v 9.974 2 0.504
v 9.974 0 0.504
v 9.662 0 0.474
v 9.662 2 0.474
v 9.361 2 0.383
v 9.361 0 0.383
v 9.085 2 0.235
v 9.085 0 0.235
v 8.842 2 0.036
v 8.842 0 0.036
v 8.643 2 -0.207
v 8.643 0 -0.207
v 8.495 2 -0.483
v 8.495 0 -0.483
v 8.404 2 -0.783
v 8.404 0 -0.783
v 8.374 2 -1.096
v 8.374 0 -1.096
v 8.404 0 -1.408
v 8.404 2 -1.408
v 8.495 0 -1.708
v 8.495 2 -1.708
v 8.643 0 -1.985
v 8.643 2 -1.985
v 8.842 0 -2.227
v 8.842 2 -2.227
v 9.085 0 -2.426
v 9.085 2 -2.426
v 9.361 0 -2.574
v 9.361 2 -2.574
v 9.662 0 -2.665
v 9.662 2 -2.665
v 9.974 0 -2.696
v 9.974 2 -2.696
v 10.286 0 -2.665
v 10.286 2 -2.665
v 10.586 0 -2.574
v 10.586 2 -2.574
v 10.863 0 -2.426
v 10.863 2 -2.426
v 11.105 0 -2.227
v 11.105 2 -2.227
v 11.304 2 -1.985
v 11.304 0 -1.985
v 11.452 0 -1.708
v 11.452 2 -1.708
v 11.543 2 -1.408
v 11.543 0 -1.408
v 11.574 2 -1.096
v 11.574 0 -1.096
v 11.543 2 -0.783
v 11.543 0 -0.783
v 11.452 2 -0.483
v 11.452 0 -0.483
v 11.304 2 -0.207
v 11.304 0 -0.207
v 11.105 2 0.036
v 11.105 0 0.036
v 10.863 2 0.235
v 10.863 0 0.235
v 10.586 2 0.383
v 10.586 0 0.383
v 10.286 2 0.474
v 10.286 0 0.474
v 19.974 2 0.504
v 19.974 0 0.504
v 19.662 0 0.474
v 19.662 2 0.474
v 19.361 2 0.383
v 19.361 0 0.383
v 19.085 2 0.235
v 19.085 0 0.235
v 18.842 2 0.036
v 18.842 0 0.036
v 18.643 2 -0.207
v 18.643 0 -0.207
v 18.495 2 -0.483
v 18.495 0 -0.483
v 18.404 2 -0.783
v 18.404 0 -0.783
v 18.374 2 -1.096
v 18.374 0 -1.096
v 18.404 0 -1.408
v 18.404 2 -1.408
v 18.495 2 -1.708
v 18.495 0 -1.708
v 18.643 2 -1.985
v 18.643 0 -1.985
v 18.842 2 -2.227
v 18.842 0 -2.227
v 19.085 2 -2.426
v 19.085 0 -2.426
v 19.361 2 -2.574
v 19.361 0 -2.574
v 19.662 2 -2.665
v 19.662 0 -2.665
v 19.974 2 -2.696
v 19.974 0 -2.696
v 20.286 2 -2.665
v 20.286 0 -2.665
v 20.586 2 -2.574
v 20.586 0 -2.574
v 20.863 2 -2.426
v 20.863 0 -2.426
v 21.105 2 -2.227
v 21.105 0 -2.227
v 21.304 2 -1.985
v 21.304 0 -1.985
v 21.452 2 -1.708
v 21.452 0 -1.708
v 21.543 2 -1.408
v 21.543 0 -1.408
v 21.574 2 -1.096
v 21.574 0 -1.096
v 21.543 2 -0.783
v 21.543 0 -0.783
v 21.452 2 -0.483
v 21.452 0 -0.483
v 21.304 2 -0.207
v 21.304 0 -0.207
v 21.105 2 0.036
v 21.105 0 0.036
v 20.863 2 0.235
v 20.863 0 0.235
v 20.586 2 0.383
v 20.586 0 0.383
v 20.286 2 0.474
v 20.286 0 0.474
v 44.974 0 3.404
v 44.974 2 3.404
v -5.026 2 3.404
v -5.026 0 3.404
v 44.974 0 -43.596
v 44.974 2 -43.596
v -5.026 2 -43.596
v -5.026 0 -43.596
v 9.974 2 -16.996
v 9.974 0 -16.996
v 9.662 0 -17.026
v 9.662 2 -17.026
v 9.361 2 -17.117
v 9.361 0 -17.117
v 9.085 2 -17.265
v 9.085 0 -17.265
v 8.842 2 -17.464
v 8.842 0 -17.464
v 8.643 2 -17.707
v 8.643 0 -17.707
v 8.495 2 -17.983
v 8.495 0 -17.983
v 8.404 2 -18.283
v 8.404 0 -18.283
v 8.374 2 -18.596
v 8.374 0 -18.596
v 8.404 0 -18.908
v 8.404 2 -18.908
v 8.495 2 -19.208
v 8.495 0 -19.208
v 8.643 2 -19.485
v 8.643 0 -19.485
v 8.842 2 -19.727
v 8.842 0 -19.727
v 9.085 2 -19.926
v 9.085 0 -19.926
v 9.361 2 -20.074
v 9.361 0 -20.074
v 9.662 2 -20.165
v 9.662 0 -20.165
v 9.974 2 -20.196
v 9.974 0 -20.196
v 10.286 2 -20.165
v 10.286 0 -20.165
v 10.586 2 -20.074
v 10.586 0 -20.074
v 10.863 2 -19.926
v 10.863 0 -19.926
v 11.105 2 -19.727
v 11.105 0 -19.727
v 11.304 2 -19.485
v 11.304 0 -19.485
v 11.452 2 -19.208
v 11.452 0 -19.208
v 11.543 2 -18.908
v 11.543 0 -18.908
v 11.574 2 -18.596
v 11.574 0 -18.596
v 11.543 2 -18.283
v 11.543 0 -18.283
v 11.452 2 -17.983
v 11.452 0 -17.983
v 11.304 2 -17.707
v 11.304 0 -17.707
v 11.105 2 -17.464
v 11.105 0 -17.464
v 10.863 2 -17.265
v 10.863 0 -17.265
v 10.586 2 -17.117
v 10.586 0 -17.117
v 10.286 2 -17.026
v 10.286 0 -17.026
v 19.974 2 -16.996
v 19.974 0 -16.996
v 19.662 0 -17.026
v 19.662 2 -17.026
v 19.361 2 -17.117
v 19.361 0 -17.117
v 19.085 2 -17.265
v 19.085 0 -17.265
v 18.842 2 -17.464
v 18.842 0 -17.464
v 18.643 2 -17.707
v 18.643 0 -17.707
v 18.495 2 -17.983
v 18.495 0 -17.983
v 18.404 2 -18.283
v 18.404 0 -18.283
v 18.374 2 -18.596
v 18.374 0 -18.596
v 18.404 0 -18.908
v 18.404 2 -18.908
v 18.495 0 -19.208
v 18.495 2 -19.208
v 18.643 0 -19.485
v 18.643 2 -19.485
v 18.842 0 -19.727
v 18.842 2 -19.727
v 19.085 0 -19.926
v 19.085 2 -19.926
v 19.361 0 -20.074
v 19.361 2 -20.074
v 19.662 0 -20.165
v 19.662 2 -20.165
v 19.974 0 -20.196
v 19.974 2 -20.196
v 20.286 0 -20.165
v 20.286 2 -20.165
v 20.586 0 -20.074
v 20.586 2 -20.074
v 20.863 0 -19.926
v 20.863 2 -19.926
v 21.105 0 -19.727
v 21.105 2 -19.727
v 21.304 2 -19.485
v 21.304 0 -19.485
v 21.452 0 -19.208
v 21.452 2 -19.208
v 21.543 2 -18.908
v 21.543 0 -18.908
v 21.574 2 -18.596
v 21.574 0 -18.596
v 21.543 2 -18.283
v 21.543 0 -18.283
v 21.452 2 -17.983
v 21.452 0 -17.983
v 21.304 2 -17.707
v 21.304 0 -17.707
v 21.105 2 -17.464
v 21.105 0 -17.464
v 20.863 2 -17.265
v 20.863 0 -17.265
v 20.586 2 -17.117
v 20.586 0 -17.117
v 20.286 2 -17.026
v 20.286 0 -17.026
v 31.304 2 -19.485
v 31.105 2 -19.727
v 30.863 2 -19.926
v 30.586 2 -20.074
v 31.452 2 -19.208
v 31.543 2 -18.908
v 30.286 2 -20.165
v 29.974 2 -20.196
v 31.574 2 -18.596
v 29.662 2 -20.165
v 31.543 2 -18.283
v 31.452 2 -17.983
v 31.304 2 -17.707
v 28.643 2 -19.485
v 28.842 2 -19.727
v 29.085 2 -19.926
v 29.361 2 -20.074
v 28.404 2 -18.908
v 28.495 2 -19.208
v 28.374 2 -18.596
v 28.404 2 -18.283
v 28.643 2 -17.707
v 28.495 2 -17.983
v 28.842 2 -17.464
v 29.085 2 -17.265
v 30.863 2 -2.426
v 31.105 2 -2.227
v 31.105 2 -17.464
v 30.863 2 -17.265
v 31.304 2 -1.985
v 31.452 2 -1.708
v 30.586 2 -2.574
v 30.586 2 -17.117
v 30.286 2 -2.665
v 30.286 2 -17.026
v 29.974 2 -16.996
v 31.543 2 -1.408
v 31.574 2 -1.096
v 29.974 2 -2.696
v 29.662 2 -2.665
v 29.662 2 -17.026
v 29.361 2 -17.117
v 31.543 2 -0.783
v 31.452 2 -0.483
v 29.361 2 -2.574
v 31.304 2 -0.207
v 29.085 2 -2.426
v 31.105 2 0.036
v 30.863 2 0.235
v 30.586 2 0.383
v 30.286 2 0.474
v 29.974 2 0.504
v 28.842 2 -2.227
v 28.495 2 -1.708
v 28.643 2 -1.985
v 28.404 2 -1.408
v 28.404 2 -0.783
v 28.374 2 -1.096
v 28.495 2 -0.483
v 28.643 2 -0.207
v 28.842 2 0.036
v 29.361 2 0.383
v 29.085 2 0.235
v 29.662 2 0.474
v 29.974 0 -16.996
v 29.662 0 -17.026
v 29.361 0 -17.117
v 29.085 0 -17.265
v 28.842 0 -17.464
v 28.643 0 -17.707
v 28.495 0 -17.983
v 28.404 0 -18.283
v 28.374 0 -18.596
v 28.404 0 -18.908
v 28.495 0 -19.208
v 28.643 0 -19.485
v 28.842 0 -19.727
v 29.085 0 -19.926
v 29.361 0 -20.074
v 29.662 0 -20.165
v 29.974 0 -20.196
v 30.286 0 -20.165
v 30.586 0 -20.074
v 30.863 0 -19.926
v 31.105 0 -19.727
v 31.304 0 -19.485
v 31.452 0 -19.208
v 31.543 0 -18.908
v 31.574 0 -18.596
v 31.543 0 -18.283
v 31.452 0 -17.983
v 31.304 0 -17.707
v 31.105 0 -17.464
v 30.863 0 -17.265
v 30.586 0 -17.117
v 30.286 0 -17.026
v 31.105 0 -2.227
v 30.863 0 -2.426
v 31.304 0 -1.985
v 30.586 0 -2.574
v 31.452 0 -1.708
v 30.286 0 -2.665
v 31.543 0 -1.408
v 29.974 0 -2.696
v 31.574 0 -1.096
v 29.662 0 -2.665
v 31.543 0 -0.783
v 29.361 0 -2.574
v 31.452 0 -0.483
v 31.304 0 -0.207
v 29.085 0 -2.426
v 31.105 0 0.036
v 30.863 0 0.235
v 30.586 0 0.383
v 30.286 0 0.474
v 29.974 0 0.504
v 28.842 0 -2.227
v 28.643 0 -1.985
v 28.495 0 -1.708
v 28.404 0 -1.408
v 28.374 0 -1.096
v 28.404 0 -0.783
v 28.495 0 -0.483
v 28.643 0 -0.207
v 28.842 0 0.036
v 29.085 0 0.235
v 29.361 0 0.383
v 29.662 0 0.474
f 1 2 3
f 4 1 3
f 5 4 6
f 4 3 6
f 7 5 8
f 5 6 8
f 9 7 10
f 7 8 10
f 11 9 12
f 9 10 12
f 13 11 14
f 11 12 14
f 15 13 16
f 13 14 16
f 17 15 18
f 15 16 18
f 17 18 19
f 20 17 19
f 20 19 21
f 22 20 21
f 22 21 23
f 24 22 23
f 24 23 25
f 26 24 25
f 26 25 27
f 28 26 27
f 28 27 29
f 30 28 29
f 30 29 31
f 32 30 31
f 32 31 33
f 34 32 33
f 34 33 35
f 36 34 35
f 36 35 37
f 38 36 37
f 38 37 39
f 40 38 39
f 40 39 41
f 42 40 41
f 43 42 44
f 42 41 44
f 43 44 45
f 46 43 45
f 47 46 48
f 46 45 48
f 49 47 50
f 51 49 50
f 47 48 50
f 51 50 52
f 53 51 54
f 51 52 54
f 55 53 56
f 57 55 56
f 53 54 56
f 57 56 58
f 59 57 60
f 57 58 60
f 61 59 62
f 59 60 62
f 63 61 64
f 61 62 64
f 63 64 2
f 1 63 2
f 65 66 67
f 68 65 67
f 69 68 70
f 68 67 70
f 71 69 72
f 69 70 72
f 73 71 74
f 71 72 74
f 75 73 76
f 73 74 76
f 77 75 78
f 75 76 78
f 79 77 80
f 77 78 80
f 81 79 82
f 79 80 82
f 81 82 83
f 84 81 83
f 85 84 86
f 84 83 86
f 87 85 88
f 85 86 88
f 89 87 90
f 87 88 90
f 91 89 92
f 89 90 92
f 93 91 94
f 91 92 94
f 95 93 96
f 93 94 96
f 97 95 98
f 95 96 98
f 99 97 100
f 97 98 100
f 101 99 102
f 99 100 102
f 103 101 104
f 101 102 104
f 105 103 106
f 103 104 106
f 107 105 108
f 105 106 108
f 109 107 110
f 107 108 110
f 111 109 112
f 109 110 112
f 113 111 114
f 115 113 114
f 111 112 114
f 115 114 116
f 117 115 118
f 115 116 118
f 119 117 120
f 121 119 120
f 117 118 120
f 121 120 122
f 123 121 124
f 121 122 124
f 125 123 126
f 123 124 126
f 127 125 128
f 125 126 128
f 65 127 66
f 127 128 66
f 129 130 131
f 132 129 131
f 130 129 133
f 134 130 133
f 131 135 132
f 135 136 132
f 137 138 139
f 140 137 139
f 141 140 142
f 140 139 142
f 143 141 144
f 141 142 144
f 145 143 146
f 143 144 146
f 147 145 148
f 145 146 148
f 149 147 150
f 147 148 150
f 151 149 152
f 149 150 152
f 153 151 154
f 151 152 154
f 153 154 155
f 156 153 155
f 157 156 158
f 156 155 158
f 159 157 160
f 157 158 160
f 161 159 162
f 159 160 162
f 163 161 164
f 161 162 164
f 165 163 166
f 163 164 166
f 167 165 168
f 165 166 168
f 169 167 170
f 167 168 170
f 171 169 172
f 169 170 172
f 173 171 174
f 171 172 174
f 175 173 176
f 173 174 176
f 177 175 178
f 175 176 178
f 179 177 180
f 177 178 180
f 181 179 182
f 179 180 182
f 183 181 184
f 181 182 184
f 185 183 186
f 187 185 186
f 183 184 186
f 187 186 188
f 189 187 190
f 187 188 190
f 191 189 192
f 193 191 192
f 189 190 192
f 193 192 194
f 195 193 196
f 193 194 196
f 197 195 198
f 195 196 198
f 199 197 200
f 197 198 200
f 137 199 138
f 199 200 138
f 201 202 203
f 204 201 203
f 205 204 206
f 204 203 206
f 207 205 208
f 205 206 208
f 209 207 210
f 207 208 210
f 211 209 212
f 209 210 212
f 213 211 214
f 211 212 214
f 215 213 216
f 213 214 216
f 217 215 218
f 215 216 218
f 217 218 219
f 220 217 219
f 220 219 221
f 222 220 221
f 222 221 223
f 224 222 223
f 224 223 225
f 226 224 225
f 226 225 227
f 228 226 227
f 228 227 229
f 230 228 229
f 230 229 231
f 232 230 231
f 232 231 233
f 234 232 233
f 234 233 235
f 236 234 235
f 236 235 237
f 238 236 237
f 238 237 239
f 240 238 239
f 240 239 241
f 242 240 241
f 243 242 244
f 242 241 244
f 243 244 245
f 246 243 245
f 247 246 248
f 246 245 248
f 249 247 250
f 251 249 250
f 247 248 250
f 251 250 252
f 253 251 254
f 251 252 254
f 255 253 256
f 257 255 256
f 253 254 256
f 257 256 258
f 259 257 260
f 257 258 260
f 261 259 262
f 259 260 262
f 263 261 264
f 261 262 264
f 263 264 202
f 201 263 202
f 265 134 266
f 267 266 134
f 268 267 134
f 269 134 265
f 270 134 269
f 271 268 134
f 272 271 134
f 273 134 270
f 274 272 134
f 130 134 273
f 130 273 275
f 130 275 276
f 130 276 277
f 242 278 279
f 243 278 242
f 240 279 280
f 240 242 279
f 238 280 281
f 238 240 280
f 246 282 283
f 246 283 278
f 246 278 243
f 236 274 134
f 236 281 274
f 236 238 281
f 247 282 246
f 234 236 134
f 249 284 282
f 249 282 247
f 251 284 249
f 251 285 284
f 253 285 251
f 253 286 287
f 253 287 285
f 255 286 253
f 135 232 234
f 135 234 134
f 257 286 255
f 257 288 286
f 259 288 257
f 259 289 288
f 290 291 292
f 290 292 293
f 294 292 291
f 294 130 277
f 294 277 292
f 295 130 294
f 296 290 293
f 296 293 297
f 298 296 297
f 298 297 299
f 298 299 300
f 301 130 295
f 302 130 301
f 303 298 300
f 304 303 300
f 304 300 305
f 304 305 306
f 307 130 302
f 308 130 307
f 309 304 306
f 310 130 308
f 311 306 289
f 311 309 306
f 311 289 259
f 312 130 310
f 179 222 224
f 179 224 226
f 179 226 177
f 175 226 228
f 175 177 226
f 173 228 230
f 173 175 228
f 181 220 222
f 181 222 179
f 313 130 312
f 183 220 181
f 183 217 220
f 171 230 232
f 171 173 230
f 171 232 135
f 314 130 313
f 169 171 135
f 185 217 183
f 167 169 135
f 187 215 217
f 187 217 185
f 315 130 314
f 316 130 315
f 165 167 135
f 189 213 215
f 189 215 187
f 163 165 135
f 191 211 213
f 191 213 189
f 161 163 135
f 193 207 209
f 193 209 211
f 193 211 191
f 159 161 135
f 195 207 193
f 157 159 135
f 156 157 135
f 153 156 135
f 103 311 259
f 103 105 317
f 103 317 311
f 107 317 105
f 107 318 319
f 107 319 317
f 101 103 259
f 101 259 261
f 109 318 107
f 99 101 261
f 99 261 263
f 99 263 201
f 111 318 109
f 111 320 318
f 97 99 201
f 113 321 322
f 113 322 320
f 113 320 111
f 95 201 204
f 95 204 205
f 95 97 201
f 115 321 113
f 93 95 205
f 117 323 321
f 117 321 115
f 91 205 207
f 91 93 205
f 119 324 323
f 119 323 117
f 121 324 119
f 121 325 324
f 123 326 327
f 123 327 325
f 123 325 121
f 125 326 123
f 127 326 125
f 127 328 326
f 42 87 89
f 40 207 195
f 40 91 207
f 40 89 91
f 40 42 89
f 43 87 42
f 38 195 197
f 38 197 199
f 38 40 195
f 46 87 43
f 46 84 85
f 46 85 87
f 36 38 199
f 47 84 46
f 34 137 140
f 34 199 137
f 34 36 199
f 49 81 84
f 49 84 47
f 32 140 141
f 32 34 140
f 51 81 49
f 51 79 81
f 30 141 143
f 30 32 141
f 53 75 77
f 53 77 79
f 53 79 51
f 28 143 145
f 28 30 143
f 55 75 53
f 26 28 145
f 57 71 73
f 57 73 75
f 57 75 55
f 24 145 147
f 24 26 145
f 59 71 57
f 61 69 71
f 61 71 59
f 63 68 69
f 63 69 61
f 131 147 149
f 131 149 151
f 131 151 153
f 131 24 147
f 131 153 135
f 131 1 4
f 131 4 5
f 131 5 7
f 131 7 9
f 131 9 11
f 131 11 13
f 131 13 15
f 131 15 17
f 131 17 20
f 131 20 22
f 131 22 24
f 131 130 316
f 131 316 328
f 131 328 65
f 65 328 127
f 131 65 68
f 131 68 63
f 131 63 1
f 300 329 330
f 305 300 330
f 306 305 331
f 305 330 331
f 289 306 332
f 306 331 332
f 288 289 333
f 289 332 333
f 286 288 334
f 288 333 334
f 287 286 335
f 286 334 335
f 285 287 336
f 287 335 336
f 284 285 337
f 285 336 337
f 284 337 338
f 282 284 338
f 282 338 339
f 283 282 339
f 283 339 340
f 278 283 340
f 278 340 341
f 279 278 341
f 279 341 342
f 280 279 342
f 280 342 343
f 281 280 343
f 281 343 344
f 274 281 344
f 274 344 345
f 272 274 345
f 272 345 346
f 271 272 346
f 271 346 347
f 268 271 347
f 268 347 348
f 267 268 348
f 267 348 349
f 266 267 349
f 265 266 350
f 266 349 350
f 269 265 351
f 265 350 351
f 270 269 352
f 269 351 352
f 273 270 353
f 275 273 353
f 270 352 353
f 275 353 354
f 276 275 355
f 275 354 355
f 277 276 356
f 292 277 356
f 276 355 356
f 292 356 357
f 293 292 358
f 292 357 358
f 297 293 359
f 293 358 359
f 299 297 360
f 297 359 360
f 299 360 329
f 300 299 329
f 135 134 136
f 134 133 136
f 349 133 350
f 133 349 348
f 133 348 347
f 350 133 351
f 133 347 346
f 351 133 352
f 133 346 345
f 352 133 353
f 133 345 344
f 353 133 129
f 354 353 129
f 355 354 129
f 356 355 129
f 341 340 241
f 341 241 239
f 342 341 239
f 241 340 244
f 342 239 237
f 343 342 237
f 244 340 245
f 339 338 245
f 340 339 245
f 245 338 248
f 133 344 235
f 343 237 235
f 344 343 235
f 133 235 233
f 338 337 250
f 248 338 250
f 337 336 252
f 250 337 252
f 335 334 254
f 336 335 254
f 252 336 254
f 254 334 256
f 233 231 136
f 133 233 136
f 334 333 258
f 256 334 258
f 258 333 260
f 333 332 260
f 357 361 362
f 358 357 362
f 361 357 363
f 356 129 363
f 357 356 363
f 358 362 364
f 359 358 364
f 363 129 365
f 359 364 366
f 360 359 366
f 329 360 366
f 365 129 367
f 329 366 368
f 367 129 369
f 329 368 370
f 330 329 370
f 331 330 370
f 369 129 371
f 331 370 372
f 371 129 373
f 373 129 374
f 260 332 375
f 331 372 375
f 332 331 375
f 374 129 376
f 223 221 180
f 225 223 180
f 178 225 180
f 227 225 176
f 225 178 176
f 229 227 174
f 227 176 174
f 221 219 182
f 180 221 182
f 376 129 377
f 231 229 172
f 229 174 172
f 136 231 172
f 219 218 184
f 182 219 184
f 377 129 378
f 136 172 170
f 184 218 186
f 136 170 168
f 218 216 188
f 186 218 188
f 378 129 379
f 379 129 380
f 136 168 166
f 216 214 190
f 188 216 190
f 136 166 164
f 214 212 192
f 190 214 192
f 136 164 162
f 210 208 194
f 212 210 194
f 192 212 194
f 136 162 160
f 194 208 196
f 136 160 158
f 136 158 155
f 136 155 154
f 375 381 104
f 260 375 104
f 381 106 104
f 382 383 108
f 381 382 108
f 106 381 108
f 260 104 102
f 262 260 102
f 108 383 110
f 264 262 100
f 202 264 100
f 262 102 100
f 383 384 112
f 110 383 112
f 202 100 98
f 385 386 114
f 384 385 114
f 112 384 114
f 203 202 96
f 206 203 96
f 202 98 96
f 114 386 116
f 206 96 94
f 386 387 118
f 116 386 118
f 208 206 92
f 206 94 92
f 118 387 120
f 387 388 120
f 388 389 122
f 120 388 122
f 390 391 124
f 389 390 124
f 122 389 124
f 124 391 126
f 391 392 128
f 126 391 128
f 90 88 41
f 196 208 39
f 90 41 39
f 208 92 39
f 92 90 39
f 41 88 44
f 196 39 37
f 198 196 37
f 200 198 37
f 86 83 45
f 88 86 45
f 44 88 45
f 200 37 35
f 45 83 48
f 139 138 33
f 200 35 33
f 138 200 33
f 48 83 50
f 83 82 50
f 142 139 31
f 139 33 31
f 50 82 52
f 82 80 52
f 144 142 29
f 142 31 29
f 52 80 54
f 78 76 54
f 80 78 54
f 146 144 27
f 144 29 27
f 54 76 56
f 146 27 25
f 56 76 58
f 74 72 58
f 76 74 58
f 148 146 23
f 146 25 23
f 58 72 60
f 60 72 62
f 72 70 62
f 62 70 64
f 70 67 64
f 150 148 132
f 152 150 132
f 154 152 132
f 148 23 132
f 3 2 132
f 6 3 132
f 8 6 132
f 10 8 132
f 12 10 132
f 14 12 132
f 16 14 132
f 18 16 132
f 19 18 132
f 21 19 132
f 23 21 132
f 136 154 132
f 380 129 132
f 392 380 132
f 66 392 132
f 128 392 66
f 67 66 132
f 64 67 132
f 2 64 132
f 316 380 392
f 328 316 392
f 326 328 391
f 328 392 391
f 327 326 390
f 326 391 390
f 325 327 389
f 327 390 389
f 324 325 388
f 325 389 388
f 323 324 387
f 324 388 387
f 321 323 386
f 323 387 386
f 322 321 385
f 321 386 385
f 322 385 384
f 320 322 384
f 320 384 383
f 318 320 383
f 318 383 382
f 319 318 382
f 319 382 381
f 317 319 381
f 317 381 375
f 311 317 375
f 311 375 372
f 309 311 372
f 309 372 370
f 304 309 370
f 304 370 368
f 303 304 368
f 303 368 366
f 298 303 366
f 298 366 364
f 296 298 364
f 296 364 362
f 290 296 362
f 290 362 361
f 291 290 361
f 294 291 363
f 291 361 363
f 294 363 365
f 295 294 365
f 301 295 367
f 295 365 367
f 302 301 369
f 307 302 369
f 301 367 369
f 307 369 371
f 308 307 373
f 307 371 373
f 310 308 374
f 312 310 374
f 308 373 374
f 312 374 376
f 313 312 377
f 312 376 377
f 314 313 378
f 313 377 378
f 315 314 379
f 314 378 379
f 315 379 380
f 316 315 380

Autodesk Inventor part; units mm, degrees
ref_plane "YZ Plane" through (0, 0, 0) normal (1, 0, 0) x (0, 1, 0)
ref_plane "XZ Plane" through (0, 0, 0) normal (0, 1, 0) x (-1, 0, 0)
ref_plane "XY Plane" through (0, 0, 0) normal (0, 0, 1) x (1, 0, 0)
sketch "スケッチ1" plane through (0, 0, 0) normal (0, 1, 0) x (-1, 0, 0)
  line L0 (5.0263, 6.4044) -> (-44.9737, 6.4044)
  line L1 (-44.9737, 6.4044) -> (-44.9737, -43.5956)
  line L2 (-44.9737, -43.5956) -> (5.0263, -43.5956)
  line L3 (5.0263, -43.5956) -> (5.0263, 6.4044)
  point P0 (0, 0)
  dimension "d0" = 50
  dimension "d1" = 50
extrude "押し出し1" add sketch "スケッチ1" along normal blind 2
sketch "スケッチ2" plane through (0, 2, 0) normal (0, 1, 0) x (1, 0, 0)
  circle A0 centre (19.9737, 1.0956) radius 1.5
  line L0 (-5.0263, -6.4044) -> (44.9737, -6.4044) projected
  line L1 (-5.0263, 43.5956) -> (-5.0263, -6.4044) projected
  circle A1 centre (9.9737, 1.0956) radius 1.5
  circle A2 centre (29.9737, 1.0956) radius 1.5
  circle A3 centre (9.9737, 18.5956) radius 1.5
  circle A4 centre (19.9737, 18.5956) radius 1.5
  circle A5 centre (29.9737, 18.5956) radius 1.5
  point P0 (0, 0)
  dimension "d4" = 3
  dimension "d5" = 7.5
  dimension "d6" = 25
  dimension "d7" = 3
  dimension "d8" = 3
  dimension "d9" = 10
  dimension "d10" = 10
  dimension "d11" = 3
  dimension "d12" = 17.5
  dimension "d13" = 3
  dimension "d14" = 3
  dimension "d15" = 10
  dimension "d16" = 10
  dimension "d17" = 17.5
hole "穴1" at (9.9737, 2, -1.0956) at (19.9737, 2, -1.0956) at (29.9737, 2, -1.0956) at (9.9737, 2, -18.5956) at (19.9737, 2, -18.5956) at (29.9737, 2, -18.5956) direction (0, -1, 0) diameter 3 depth 2
sketch "スケッチ3" plane through (0, 2, 0) normal (0, 1, 0) x (1, 0, 0)
  line L0 (-4.9253, -3.4044) -> (44.9737, -3.4044)
  line L1 (44.9737, -6.4044) -> (44.9737, 43.5956) projected
  line L2 (-5.0263, -6.4044) -> (44.9737, -6.4044) projected
  point P0 (0, 0)
  dimension "d25" = 3
sketch "スケッチ4" plane through (0, 2, 0) normal (0, 1, 0) x (1, 0, 0)
  line L0 (-5.0263, 43.5956) -> (-5.0263, -6.4044) projected
  line L1 (-5.0263, -6.4044) -> (44.9737, -6.4044) projected
  line L2 (-5.0263, -6.4044) -> (44.9737, -6.4044)
  line L3 (44.9737, -6.4044) -> (44.9737, -3.4044)
  line L4 (44.9737, -6.4044) -> (44.9737, 43.5956) projected
  line L5 (44.9737, -3.4044) -> (-5.0263, -3.4044)
  line L6 (-5.0263, -3.4044) -> (-5.0263, -6.4044)
  point P0 (0, 0)
  dimension "d26" = 3
extrude "押し出し2" cut sketch "スケッチ4" against normal blind 10
sketch "スケッチ5" plane through (0, 2, 0) normal (0, 1, 0) x (1, 0, 0)
  circle A0 centre (9.9737, 1.0956) radius 1.6
  line L0 (-5.0263, -3.4044) -> (44.9737, -3.4044) projected
  circle A1 centre (9.9737, 18.5956) radius 1.5 projected
  circle A2 centre (9.9737, 18.5956) radius 1.6
  circle A3 centre (19.9737, 18.5956) radius 1.6
  circle A4 centre (19.9737, 1.0956) radius 1.6
  circle A5 centre (29.9737, 18.5956) radius 1.6
  circle A6 centre (29.9737, 1.0956) radius 1.6
  line L1 (-5.0263, 43.5956) -> (-5.0263, -3.4044) projected
  point P0 (0, 0)
  dimension "d29" = 3.2
  dimension "d30" = 4.5
  dimension "d32" = 3.2
  dimension "d33" = 3.2
  dimension "d34" = 3.2
  dimension "d35" = 3.2
  dimension "d36" = 3.2
  dimension "d37" = 4.5
  dimension "d38" = 17.5
  dimension "d39" = 17.5
  dimension "d40" = 17.5
  dimension "d41" = 4.5
  dimension "d42" = 10
  dimension "d43" = 10
  dimension "d44" = 10
  dimension "d45" = 15
  dimension "d46" = 15
  dimension "d47" = 10
hole "穴2" at (9.9737, 2, -1.0956) at (19.9737, 2, -1.0956) at (29.9737, 2, -1.0956) at (29.9737, 2, -18.5956) at (19.9737, 2, -18.5956) at (9.9737, 2, -18.5956) direction (0, -1, 0) diameter 3.2 depth 3
equation "\"BendRadius\" = Thickness"
equation "\"BendReliefWidth\" = Thickness"
equation "\"BendReliefDepth\" = 0.5 * Thickness"
equation "\"CornerReliefSize\" = 4 * Thickness"
equation "\"MinimumRemnant\" = 2 * Thickness"
equation "\"TransitionRadius\" = BendRadius"
equation "\"JacobiRadiusSize\" = BendRadius"
equation "\"GapSize\" = Thickness"
equation "\"Thickness\" = 0.5"
properties part number "nhk20" material "アルミニウム 6061"
